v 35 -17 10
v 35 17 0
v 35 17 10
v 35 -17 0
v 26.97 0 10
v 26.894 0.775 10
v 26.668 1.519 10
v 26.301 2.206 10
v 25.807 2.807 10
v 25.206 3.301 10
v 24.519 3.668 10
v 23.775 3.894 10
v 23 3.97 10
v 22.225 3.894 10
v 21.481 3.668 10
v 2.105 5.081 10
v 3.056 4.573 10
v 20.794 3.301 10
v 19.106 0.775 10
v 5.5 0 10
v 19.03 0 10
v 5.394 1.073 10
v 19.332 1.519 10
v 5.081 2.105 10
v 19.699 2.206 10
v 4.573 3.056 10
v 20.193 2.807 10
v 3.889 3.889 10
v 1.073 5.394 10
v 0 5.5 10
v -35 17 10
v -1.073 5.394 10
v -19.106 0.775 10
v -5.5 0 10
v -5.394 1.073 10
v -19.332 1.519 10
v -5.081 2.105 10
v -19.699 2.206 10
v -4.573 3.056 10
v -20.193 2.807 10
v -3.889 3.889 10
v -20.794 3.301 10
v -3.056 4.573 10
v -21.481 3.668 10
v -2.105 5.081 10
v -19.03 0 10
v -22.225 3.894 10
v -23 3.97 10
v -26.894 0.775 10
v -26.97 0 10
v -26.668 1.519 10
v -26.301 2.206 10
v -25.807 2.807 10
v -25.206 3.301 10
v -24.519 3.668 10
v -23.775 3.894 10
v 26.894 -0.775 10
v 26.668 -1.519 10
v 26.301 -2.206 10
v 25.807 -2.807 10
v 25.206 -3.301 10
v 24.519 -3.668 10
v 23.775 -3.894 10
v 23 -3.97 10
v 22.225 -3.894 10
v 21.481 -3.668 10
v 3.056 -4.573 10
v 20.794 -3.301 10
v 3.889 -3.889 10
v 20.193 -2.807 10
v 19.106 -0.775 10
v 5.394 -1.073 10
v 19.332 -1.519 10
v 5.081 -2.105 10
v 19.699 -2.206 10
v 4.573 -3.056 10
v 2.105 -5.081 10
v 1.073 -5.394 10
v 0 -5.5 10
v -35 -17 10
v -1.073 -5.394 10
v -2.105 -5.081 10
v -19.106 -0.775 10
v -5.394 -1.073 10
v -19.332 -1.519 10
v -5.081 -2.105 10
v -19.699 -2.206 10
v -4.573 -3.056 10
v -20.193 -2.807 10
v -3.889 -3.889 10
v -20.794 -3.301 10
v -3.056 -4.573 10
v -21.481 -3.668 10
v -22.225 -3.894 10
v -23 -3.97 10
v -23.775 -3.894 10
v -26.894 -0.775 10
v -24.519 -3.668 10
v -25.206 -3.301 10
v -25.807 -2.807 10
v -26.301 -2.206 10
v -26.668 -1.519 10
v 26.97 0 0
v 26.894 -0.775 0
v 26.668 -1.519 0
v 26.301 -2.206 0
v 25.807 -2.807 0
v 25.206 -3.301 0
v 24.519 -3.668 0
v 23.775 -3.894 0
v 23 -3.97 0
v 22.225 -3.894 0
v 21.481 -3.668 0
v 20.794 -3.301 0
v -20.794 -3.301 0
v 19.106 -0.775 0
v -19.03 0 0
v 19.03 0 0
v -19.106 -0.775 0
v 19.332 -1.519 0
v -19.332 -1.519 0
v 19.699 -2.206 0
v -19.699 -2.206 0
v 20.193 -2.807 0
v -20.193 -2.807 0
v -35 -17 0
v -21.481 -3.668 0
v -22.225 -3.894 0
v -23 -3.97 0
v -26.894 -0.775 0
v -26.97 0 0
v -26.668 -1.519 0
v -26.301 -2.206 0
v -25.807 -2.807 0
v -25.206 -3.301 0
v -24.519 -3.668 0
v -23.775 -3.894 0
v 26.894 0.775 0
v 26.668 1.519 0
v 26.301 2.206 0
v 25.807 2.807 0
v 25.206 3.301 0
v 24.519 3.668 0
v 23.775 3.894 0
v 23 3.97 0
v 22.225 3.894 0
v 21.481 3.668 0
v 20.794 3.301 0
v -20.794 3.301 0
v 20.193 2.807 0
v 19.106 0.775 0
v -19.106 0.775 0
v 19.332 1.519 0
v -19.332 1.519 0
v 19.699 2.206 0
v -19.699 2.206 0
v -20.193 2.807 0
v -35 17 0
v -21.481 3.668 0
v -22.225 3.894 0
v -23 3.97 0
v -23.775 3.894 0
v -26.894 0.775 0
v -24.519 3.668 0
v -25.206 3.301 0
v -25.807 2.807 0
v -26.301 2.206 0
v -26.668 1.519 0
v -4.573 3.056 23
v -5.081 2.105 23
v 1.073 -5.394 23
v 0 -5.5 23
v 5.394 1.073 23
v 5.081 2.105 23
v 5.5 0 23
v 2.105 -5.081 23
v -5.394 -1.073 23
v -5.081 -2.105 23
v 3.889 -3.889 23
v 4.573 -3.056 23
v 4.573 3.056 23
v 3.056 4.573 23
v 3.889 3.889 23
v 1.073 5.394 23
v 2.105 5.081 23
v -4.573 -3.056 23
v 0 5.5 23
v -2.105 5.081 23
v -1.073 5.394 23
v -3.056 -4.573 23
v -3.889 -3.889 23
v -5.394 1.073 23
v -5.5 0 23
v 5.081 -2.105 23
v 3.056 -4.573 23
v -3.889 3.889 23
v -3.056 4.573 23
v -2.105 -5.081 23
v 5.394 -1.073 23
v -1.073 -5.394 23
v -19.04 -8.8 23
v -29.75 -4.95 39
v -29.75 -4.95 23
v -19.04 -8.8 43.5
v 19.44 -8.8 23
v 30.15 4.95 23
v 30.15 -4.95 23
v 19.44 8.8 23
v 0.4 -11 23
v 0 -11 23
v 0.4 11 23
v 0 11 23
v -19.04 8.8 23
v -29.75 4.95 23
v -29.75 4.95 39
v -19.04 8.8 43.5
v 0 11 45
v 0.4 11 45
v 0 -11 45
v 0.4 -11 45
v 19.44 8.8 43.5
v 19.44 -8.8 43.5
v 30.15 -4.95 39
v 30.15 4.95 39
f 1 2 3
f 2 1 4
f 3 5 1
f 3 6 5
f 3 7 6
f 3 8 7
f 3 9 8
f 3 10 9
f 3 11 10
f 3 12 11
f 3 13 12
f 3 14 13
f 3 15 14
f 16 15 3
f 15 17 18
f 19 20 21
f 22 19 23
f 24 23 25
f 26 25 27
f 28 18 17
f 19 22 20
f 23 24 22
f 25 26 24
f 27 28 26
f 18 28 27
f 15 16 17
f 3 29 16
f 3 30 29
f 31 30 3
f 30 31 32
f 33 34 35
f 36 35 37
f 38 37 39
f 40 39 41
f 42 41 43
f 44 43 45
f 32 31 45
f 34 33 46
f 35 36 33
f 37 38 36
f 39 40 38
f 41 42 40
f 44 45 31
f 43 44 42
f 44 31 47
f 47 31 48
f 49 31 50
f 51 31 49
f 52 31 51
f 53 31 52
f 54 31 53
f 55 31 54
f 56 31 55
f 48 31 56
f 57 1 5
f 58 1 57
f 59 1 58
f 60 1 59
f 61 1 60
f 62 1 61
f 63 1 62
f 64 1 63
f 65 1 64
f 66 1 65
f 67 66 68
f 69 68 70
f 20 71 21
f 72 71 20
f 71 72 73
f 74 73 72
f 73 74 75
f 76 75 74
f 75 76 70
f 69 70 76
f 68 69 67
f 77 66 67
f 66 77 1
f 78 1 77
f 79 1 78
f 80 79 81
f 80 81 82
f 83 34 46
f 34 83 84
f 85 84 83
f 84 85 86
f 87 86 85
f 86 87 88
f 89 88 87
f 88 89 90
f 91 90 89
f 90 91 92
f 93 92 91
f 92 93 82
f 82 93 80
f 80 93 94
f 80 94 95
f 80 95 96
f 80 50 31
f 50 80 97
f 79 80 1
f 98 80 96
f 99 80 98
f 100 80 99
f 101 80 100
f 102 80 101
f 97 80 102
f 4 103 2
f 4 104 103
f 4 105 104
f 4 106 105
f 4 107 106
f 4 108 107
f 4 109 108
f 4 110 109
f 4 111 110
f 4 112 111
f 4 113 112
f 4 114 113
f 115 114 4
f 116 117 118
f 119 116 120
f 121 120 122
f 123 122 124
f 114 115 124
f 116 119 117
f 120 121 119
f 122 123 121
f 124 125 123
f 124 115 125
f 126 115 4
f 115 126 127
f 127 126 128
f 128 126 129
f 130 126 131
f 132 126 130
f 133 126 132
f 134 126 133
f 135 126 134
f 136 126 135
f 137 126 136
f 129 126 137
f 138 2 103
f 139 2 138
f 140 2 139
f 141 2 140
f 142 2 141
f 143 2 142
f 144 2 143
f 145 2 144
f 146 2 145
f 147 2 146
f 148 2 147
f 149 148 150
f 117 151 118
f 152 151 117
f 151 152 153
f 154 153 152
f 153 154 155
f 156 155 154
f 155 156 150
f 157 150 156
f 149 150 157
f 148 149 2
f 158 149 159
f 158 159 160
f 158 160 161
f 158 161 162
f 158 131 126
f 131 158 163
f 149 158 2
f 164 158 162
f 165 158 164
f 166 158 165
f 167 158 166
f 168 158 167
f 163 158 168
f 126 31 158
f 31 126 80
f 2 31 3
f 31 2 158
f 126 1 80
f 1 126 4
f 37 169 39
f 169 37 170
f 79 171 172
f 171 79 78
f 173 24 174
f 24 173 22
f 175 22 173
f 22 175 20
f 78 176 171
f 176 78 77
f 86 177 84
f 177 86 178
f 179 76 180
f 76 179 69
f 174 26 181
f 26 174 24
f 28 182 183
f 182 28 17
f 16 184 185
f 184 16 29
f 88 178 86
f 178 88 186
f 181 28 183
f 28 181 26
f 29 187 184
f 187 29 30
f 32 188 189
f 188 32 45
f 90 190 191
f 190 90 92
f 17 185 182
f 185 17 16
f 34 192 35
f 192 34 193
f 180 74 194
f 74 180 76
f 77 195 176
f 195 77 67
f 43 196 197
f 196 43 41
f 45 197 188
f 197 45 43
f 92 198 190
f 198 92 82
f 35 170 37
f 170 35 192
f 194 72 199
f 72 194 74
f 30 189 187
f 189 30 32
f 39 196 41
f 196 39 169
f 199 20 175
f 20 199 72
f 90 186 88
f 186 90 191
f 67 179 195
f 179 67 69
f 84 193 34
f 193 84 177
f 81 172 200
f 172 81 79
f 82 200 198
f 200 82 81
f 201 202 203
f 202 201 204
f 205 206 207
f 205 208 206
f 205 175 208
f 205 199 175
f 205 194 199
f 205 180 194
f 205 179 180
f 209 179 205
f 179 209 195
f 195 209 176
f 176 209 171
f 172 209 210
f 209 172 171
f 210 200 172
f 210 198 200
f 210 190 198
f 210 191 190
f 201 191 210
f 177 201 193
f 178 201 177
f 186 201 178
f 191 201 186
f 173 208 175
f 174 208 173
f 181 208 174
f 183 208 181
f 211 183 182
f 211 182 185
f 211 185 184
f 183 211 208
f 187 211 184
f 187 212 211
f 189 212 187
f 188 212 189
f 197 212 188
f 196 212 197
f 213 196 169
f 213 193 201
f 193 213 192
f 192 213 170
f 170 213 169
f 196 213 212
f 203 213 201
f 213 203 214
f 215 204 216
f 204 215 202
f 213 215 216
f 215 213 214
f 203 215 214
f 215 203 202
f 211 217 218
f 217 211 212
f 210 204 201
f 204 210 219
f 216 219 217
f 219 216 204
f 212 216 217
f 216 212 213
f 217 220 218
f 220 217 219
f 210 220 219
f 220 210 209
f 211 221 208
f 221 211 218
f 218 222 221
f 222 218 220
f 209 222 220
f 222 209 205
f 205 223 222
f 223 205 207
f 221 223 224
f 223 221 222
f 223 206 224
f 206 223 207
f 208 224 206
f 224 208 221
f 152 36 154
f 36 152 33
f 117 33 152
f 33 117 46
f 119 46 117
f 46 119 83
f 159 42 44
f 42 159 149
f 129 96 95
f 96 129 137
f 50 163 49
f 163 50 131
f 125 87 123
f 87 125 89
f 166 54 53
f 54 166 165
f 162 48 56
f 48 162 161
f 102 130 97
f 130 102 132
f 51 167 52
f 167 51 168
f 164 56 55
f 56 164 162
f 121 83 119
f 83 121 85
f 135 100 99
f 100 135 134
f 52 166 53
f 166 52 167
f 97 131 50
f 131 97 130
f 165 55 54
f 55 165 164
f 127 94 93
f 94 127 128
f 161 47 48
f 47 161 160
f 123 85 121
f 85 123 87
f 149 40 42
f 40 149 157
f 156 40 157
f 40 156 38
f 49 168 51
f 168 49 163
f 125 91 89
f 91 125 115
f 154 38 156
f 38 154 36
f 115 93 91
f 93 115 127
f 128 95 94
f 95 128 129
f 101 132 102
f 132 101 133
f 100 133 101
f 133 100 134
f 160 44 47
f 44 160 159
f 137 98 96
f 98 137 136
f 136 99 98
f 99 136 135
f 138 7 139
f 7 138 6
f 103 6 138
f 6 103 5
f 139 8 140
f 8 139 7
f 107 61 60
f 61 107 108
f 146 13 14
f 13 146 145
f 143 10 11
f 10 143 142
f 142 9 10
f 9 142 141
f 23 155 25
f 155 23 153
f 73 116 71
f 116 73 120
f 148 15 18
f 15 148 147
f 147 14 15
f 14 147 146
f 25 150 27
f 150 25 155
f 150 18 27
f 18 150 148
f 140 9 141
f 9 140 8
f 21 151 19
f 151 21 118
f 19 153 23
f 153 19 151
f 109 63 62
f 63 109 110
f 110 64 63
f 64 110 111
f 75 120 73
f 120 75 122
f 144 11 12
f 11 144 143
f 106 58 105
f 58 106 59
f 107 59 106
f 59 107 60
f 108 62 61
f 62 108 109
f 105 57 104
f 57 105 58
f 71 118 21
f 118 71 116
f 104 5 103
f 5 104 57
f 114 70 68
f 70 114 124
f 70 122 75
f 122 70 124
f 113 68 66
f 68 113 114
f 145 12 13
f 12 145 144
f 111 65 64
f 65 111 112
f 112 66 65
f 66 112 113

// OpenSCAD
$fn = 32;

// ----------------------------------------------------------------------
// Boat cleat: 70 mm base, horn 34 mm up
// ----------------------------------------------------------------------

// --- parameters (mm) ---
base_l = 70;              // base length
base_w = 34;              // base width
base_t = 10;              // base thickness
horn_len = 59.5;          // horn length
horn_d = 22;              // horn diameter at the middle
horn_z = 34;              // horn axis height
end_drop = 6;             // how far the horn tips drop
post_d = 11;              // centre post diameter
holes_d = 7.94;           // fixing holes
hole_x = 23;              // fixing hole spacing

difference() {
  union() {
    translate([-35, -17, 0]) cube([base_l, base_w, base_t]);
    /* centre post, sunk 1 mm into the base */
    translate([0, 0, 9]) cylinder(h = 25, d = post_d);
    /* horn: a hull chain of boxes, full in the middle and lighter at the tips */
    hull() {
      translate([-29.75, -4.95, 23]) cube([0.4, 9.9, 16], center = false);
      translate([-19.04, -8.8, 23]) cube([0.4, 17.6, 20.5], center = false);
    }
    hull() {
      translate([-19.04, -8.8, 23]) cube([0.4, 17.6, 20.5], center = false);
      translate([0, -11, 23]) cube([0.4, 22, 22], center = false);
    }
    hull() {
      translate([0, -11, 23]) cube([0.4, 22, 22], center = false);
      translate([19.04, -8.8, 23]) cube([0.4, 17.6, 20.5], center = false);
    }
    hull() {
      translate([19.04, -8.8, 23]) cube([0.4, 17.6, 20.5], center = false);
      translate([29.75, -4.95, 23]) cube([0.4, 9.9, 16], center = false);
    }
  }
  translate([-23, 0, -2.5]) cylinder(h = base_t + 5, d = holes_d);
  translate([23, 0, -2.5]) cylinder(h = base_t + 5, d = holes_d);
}
